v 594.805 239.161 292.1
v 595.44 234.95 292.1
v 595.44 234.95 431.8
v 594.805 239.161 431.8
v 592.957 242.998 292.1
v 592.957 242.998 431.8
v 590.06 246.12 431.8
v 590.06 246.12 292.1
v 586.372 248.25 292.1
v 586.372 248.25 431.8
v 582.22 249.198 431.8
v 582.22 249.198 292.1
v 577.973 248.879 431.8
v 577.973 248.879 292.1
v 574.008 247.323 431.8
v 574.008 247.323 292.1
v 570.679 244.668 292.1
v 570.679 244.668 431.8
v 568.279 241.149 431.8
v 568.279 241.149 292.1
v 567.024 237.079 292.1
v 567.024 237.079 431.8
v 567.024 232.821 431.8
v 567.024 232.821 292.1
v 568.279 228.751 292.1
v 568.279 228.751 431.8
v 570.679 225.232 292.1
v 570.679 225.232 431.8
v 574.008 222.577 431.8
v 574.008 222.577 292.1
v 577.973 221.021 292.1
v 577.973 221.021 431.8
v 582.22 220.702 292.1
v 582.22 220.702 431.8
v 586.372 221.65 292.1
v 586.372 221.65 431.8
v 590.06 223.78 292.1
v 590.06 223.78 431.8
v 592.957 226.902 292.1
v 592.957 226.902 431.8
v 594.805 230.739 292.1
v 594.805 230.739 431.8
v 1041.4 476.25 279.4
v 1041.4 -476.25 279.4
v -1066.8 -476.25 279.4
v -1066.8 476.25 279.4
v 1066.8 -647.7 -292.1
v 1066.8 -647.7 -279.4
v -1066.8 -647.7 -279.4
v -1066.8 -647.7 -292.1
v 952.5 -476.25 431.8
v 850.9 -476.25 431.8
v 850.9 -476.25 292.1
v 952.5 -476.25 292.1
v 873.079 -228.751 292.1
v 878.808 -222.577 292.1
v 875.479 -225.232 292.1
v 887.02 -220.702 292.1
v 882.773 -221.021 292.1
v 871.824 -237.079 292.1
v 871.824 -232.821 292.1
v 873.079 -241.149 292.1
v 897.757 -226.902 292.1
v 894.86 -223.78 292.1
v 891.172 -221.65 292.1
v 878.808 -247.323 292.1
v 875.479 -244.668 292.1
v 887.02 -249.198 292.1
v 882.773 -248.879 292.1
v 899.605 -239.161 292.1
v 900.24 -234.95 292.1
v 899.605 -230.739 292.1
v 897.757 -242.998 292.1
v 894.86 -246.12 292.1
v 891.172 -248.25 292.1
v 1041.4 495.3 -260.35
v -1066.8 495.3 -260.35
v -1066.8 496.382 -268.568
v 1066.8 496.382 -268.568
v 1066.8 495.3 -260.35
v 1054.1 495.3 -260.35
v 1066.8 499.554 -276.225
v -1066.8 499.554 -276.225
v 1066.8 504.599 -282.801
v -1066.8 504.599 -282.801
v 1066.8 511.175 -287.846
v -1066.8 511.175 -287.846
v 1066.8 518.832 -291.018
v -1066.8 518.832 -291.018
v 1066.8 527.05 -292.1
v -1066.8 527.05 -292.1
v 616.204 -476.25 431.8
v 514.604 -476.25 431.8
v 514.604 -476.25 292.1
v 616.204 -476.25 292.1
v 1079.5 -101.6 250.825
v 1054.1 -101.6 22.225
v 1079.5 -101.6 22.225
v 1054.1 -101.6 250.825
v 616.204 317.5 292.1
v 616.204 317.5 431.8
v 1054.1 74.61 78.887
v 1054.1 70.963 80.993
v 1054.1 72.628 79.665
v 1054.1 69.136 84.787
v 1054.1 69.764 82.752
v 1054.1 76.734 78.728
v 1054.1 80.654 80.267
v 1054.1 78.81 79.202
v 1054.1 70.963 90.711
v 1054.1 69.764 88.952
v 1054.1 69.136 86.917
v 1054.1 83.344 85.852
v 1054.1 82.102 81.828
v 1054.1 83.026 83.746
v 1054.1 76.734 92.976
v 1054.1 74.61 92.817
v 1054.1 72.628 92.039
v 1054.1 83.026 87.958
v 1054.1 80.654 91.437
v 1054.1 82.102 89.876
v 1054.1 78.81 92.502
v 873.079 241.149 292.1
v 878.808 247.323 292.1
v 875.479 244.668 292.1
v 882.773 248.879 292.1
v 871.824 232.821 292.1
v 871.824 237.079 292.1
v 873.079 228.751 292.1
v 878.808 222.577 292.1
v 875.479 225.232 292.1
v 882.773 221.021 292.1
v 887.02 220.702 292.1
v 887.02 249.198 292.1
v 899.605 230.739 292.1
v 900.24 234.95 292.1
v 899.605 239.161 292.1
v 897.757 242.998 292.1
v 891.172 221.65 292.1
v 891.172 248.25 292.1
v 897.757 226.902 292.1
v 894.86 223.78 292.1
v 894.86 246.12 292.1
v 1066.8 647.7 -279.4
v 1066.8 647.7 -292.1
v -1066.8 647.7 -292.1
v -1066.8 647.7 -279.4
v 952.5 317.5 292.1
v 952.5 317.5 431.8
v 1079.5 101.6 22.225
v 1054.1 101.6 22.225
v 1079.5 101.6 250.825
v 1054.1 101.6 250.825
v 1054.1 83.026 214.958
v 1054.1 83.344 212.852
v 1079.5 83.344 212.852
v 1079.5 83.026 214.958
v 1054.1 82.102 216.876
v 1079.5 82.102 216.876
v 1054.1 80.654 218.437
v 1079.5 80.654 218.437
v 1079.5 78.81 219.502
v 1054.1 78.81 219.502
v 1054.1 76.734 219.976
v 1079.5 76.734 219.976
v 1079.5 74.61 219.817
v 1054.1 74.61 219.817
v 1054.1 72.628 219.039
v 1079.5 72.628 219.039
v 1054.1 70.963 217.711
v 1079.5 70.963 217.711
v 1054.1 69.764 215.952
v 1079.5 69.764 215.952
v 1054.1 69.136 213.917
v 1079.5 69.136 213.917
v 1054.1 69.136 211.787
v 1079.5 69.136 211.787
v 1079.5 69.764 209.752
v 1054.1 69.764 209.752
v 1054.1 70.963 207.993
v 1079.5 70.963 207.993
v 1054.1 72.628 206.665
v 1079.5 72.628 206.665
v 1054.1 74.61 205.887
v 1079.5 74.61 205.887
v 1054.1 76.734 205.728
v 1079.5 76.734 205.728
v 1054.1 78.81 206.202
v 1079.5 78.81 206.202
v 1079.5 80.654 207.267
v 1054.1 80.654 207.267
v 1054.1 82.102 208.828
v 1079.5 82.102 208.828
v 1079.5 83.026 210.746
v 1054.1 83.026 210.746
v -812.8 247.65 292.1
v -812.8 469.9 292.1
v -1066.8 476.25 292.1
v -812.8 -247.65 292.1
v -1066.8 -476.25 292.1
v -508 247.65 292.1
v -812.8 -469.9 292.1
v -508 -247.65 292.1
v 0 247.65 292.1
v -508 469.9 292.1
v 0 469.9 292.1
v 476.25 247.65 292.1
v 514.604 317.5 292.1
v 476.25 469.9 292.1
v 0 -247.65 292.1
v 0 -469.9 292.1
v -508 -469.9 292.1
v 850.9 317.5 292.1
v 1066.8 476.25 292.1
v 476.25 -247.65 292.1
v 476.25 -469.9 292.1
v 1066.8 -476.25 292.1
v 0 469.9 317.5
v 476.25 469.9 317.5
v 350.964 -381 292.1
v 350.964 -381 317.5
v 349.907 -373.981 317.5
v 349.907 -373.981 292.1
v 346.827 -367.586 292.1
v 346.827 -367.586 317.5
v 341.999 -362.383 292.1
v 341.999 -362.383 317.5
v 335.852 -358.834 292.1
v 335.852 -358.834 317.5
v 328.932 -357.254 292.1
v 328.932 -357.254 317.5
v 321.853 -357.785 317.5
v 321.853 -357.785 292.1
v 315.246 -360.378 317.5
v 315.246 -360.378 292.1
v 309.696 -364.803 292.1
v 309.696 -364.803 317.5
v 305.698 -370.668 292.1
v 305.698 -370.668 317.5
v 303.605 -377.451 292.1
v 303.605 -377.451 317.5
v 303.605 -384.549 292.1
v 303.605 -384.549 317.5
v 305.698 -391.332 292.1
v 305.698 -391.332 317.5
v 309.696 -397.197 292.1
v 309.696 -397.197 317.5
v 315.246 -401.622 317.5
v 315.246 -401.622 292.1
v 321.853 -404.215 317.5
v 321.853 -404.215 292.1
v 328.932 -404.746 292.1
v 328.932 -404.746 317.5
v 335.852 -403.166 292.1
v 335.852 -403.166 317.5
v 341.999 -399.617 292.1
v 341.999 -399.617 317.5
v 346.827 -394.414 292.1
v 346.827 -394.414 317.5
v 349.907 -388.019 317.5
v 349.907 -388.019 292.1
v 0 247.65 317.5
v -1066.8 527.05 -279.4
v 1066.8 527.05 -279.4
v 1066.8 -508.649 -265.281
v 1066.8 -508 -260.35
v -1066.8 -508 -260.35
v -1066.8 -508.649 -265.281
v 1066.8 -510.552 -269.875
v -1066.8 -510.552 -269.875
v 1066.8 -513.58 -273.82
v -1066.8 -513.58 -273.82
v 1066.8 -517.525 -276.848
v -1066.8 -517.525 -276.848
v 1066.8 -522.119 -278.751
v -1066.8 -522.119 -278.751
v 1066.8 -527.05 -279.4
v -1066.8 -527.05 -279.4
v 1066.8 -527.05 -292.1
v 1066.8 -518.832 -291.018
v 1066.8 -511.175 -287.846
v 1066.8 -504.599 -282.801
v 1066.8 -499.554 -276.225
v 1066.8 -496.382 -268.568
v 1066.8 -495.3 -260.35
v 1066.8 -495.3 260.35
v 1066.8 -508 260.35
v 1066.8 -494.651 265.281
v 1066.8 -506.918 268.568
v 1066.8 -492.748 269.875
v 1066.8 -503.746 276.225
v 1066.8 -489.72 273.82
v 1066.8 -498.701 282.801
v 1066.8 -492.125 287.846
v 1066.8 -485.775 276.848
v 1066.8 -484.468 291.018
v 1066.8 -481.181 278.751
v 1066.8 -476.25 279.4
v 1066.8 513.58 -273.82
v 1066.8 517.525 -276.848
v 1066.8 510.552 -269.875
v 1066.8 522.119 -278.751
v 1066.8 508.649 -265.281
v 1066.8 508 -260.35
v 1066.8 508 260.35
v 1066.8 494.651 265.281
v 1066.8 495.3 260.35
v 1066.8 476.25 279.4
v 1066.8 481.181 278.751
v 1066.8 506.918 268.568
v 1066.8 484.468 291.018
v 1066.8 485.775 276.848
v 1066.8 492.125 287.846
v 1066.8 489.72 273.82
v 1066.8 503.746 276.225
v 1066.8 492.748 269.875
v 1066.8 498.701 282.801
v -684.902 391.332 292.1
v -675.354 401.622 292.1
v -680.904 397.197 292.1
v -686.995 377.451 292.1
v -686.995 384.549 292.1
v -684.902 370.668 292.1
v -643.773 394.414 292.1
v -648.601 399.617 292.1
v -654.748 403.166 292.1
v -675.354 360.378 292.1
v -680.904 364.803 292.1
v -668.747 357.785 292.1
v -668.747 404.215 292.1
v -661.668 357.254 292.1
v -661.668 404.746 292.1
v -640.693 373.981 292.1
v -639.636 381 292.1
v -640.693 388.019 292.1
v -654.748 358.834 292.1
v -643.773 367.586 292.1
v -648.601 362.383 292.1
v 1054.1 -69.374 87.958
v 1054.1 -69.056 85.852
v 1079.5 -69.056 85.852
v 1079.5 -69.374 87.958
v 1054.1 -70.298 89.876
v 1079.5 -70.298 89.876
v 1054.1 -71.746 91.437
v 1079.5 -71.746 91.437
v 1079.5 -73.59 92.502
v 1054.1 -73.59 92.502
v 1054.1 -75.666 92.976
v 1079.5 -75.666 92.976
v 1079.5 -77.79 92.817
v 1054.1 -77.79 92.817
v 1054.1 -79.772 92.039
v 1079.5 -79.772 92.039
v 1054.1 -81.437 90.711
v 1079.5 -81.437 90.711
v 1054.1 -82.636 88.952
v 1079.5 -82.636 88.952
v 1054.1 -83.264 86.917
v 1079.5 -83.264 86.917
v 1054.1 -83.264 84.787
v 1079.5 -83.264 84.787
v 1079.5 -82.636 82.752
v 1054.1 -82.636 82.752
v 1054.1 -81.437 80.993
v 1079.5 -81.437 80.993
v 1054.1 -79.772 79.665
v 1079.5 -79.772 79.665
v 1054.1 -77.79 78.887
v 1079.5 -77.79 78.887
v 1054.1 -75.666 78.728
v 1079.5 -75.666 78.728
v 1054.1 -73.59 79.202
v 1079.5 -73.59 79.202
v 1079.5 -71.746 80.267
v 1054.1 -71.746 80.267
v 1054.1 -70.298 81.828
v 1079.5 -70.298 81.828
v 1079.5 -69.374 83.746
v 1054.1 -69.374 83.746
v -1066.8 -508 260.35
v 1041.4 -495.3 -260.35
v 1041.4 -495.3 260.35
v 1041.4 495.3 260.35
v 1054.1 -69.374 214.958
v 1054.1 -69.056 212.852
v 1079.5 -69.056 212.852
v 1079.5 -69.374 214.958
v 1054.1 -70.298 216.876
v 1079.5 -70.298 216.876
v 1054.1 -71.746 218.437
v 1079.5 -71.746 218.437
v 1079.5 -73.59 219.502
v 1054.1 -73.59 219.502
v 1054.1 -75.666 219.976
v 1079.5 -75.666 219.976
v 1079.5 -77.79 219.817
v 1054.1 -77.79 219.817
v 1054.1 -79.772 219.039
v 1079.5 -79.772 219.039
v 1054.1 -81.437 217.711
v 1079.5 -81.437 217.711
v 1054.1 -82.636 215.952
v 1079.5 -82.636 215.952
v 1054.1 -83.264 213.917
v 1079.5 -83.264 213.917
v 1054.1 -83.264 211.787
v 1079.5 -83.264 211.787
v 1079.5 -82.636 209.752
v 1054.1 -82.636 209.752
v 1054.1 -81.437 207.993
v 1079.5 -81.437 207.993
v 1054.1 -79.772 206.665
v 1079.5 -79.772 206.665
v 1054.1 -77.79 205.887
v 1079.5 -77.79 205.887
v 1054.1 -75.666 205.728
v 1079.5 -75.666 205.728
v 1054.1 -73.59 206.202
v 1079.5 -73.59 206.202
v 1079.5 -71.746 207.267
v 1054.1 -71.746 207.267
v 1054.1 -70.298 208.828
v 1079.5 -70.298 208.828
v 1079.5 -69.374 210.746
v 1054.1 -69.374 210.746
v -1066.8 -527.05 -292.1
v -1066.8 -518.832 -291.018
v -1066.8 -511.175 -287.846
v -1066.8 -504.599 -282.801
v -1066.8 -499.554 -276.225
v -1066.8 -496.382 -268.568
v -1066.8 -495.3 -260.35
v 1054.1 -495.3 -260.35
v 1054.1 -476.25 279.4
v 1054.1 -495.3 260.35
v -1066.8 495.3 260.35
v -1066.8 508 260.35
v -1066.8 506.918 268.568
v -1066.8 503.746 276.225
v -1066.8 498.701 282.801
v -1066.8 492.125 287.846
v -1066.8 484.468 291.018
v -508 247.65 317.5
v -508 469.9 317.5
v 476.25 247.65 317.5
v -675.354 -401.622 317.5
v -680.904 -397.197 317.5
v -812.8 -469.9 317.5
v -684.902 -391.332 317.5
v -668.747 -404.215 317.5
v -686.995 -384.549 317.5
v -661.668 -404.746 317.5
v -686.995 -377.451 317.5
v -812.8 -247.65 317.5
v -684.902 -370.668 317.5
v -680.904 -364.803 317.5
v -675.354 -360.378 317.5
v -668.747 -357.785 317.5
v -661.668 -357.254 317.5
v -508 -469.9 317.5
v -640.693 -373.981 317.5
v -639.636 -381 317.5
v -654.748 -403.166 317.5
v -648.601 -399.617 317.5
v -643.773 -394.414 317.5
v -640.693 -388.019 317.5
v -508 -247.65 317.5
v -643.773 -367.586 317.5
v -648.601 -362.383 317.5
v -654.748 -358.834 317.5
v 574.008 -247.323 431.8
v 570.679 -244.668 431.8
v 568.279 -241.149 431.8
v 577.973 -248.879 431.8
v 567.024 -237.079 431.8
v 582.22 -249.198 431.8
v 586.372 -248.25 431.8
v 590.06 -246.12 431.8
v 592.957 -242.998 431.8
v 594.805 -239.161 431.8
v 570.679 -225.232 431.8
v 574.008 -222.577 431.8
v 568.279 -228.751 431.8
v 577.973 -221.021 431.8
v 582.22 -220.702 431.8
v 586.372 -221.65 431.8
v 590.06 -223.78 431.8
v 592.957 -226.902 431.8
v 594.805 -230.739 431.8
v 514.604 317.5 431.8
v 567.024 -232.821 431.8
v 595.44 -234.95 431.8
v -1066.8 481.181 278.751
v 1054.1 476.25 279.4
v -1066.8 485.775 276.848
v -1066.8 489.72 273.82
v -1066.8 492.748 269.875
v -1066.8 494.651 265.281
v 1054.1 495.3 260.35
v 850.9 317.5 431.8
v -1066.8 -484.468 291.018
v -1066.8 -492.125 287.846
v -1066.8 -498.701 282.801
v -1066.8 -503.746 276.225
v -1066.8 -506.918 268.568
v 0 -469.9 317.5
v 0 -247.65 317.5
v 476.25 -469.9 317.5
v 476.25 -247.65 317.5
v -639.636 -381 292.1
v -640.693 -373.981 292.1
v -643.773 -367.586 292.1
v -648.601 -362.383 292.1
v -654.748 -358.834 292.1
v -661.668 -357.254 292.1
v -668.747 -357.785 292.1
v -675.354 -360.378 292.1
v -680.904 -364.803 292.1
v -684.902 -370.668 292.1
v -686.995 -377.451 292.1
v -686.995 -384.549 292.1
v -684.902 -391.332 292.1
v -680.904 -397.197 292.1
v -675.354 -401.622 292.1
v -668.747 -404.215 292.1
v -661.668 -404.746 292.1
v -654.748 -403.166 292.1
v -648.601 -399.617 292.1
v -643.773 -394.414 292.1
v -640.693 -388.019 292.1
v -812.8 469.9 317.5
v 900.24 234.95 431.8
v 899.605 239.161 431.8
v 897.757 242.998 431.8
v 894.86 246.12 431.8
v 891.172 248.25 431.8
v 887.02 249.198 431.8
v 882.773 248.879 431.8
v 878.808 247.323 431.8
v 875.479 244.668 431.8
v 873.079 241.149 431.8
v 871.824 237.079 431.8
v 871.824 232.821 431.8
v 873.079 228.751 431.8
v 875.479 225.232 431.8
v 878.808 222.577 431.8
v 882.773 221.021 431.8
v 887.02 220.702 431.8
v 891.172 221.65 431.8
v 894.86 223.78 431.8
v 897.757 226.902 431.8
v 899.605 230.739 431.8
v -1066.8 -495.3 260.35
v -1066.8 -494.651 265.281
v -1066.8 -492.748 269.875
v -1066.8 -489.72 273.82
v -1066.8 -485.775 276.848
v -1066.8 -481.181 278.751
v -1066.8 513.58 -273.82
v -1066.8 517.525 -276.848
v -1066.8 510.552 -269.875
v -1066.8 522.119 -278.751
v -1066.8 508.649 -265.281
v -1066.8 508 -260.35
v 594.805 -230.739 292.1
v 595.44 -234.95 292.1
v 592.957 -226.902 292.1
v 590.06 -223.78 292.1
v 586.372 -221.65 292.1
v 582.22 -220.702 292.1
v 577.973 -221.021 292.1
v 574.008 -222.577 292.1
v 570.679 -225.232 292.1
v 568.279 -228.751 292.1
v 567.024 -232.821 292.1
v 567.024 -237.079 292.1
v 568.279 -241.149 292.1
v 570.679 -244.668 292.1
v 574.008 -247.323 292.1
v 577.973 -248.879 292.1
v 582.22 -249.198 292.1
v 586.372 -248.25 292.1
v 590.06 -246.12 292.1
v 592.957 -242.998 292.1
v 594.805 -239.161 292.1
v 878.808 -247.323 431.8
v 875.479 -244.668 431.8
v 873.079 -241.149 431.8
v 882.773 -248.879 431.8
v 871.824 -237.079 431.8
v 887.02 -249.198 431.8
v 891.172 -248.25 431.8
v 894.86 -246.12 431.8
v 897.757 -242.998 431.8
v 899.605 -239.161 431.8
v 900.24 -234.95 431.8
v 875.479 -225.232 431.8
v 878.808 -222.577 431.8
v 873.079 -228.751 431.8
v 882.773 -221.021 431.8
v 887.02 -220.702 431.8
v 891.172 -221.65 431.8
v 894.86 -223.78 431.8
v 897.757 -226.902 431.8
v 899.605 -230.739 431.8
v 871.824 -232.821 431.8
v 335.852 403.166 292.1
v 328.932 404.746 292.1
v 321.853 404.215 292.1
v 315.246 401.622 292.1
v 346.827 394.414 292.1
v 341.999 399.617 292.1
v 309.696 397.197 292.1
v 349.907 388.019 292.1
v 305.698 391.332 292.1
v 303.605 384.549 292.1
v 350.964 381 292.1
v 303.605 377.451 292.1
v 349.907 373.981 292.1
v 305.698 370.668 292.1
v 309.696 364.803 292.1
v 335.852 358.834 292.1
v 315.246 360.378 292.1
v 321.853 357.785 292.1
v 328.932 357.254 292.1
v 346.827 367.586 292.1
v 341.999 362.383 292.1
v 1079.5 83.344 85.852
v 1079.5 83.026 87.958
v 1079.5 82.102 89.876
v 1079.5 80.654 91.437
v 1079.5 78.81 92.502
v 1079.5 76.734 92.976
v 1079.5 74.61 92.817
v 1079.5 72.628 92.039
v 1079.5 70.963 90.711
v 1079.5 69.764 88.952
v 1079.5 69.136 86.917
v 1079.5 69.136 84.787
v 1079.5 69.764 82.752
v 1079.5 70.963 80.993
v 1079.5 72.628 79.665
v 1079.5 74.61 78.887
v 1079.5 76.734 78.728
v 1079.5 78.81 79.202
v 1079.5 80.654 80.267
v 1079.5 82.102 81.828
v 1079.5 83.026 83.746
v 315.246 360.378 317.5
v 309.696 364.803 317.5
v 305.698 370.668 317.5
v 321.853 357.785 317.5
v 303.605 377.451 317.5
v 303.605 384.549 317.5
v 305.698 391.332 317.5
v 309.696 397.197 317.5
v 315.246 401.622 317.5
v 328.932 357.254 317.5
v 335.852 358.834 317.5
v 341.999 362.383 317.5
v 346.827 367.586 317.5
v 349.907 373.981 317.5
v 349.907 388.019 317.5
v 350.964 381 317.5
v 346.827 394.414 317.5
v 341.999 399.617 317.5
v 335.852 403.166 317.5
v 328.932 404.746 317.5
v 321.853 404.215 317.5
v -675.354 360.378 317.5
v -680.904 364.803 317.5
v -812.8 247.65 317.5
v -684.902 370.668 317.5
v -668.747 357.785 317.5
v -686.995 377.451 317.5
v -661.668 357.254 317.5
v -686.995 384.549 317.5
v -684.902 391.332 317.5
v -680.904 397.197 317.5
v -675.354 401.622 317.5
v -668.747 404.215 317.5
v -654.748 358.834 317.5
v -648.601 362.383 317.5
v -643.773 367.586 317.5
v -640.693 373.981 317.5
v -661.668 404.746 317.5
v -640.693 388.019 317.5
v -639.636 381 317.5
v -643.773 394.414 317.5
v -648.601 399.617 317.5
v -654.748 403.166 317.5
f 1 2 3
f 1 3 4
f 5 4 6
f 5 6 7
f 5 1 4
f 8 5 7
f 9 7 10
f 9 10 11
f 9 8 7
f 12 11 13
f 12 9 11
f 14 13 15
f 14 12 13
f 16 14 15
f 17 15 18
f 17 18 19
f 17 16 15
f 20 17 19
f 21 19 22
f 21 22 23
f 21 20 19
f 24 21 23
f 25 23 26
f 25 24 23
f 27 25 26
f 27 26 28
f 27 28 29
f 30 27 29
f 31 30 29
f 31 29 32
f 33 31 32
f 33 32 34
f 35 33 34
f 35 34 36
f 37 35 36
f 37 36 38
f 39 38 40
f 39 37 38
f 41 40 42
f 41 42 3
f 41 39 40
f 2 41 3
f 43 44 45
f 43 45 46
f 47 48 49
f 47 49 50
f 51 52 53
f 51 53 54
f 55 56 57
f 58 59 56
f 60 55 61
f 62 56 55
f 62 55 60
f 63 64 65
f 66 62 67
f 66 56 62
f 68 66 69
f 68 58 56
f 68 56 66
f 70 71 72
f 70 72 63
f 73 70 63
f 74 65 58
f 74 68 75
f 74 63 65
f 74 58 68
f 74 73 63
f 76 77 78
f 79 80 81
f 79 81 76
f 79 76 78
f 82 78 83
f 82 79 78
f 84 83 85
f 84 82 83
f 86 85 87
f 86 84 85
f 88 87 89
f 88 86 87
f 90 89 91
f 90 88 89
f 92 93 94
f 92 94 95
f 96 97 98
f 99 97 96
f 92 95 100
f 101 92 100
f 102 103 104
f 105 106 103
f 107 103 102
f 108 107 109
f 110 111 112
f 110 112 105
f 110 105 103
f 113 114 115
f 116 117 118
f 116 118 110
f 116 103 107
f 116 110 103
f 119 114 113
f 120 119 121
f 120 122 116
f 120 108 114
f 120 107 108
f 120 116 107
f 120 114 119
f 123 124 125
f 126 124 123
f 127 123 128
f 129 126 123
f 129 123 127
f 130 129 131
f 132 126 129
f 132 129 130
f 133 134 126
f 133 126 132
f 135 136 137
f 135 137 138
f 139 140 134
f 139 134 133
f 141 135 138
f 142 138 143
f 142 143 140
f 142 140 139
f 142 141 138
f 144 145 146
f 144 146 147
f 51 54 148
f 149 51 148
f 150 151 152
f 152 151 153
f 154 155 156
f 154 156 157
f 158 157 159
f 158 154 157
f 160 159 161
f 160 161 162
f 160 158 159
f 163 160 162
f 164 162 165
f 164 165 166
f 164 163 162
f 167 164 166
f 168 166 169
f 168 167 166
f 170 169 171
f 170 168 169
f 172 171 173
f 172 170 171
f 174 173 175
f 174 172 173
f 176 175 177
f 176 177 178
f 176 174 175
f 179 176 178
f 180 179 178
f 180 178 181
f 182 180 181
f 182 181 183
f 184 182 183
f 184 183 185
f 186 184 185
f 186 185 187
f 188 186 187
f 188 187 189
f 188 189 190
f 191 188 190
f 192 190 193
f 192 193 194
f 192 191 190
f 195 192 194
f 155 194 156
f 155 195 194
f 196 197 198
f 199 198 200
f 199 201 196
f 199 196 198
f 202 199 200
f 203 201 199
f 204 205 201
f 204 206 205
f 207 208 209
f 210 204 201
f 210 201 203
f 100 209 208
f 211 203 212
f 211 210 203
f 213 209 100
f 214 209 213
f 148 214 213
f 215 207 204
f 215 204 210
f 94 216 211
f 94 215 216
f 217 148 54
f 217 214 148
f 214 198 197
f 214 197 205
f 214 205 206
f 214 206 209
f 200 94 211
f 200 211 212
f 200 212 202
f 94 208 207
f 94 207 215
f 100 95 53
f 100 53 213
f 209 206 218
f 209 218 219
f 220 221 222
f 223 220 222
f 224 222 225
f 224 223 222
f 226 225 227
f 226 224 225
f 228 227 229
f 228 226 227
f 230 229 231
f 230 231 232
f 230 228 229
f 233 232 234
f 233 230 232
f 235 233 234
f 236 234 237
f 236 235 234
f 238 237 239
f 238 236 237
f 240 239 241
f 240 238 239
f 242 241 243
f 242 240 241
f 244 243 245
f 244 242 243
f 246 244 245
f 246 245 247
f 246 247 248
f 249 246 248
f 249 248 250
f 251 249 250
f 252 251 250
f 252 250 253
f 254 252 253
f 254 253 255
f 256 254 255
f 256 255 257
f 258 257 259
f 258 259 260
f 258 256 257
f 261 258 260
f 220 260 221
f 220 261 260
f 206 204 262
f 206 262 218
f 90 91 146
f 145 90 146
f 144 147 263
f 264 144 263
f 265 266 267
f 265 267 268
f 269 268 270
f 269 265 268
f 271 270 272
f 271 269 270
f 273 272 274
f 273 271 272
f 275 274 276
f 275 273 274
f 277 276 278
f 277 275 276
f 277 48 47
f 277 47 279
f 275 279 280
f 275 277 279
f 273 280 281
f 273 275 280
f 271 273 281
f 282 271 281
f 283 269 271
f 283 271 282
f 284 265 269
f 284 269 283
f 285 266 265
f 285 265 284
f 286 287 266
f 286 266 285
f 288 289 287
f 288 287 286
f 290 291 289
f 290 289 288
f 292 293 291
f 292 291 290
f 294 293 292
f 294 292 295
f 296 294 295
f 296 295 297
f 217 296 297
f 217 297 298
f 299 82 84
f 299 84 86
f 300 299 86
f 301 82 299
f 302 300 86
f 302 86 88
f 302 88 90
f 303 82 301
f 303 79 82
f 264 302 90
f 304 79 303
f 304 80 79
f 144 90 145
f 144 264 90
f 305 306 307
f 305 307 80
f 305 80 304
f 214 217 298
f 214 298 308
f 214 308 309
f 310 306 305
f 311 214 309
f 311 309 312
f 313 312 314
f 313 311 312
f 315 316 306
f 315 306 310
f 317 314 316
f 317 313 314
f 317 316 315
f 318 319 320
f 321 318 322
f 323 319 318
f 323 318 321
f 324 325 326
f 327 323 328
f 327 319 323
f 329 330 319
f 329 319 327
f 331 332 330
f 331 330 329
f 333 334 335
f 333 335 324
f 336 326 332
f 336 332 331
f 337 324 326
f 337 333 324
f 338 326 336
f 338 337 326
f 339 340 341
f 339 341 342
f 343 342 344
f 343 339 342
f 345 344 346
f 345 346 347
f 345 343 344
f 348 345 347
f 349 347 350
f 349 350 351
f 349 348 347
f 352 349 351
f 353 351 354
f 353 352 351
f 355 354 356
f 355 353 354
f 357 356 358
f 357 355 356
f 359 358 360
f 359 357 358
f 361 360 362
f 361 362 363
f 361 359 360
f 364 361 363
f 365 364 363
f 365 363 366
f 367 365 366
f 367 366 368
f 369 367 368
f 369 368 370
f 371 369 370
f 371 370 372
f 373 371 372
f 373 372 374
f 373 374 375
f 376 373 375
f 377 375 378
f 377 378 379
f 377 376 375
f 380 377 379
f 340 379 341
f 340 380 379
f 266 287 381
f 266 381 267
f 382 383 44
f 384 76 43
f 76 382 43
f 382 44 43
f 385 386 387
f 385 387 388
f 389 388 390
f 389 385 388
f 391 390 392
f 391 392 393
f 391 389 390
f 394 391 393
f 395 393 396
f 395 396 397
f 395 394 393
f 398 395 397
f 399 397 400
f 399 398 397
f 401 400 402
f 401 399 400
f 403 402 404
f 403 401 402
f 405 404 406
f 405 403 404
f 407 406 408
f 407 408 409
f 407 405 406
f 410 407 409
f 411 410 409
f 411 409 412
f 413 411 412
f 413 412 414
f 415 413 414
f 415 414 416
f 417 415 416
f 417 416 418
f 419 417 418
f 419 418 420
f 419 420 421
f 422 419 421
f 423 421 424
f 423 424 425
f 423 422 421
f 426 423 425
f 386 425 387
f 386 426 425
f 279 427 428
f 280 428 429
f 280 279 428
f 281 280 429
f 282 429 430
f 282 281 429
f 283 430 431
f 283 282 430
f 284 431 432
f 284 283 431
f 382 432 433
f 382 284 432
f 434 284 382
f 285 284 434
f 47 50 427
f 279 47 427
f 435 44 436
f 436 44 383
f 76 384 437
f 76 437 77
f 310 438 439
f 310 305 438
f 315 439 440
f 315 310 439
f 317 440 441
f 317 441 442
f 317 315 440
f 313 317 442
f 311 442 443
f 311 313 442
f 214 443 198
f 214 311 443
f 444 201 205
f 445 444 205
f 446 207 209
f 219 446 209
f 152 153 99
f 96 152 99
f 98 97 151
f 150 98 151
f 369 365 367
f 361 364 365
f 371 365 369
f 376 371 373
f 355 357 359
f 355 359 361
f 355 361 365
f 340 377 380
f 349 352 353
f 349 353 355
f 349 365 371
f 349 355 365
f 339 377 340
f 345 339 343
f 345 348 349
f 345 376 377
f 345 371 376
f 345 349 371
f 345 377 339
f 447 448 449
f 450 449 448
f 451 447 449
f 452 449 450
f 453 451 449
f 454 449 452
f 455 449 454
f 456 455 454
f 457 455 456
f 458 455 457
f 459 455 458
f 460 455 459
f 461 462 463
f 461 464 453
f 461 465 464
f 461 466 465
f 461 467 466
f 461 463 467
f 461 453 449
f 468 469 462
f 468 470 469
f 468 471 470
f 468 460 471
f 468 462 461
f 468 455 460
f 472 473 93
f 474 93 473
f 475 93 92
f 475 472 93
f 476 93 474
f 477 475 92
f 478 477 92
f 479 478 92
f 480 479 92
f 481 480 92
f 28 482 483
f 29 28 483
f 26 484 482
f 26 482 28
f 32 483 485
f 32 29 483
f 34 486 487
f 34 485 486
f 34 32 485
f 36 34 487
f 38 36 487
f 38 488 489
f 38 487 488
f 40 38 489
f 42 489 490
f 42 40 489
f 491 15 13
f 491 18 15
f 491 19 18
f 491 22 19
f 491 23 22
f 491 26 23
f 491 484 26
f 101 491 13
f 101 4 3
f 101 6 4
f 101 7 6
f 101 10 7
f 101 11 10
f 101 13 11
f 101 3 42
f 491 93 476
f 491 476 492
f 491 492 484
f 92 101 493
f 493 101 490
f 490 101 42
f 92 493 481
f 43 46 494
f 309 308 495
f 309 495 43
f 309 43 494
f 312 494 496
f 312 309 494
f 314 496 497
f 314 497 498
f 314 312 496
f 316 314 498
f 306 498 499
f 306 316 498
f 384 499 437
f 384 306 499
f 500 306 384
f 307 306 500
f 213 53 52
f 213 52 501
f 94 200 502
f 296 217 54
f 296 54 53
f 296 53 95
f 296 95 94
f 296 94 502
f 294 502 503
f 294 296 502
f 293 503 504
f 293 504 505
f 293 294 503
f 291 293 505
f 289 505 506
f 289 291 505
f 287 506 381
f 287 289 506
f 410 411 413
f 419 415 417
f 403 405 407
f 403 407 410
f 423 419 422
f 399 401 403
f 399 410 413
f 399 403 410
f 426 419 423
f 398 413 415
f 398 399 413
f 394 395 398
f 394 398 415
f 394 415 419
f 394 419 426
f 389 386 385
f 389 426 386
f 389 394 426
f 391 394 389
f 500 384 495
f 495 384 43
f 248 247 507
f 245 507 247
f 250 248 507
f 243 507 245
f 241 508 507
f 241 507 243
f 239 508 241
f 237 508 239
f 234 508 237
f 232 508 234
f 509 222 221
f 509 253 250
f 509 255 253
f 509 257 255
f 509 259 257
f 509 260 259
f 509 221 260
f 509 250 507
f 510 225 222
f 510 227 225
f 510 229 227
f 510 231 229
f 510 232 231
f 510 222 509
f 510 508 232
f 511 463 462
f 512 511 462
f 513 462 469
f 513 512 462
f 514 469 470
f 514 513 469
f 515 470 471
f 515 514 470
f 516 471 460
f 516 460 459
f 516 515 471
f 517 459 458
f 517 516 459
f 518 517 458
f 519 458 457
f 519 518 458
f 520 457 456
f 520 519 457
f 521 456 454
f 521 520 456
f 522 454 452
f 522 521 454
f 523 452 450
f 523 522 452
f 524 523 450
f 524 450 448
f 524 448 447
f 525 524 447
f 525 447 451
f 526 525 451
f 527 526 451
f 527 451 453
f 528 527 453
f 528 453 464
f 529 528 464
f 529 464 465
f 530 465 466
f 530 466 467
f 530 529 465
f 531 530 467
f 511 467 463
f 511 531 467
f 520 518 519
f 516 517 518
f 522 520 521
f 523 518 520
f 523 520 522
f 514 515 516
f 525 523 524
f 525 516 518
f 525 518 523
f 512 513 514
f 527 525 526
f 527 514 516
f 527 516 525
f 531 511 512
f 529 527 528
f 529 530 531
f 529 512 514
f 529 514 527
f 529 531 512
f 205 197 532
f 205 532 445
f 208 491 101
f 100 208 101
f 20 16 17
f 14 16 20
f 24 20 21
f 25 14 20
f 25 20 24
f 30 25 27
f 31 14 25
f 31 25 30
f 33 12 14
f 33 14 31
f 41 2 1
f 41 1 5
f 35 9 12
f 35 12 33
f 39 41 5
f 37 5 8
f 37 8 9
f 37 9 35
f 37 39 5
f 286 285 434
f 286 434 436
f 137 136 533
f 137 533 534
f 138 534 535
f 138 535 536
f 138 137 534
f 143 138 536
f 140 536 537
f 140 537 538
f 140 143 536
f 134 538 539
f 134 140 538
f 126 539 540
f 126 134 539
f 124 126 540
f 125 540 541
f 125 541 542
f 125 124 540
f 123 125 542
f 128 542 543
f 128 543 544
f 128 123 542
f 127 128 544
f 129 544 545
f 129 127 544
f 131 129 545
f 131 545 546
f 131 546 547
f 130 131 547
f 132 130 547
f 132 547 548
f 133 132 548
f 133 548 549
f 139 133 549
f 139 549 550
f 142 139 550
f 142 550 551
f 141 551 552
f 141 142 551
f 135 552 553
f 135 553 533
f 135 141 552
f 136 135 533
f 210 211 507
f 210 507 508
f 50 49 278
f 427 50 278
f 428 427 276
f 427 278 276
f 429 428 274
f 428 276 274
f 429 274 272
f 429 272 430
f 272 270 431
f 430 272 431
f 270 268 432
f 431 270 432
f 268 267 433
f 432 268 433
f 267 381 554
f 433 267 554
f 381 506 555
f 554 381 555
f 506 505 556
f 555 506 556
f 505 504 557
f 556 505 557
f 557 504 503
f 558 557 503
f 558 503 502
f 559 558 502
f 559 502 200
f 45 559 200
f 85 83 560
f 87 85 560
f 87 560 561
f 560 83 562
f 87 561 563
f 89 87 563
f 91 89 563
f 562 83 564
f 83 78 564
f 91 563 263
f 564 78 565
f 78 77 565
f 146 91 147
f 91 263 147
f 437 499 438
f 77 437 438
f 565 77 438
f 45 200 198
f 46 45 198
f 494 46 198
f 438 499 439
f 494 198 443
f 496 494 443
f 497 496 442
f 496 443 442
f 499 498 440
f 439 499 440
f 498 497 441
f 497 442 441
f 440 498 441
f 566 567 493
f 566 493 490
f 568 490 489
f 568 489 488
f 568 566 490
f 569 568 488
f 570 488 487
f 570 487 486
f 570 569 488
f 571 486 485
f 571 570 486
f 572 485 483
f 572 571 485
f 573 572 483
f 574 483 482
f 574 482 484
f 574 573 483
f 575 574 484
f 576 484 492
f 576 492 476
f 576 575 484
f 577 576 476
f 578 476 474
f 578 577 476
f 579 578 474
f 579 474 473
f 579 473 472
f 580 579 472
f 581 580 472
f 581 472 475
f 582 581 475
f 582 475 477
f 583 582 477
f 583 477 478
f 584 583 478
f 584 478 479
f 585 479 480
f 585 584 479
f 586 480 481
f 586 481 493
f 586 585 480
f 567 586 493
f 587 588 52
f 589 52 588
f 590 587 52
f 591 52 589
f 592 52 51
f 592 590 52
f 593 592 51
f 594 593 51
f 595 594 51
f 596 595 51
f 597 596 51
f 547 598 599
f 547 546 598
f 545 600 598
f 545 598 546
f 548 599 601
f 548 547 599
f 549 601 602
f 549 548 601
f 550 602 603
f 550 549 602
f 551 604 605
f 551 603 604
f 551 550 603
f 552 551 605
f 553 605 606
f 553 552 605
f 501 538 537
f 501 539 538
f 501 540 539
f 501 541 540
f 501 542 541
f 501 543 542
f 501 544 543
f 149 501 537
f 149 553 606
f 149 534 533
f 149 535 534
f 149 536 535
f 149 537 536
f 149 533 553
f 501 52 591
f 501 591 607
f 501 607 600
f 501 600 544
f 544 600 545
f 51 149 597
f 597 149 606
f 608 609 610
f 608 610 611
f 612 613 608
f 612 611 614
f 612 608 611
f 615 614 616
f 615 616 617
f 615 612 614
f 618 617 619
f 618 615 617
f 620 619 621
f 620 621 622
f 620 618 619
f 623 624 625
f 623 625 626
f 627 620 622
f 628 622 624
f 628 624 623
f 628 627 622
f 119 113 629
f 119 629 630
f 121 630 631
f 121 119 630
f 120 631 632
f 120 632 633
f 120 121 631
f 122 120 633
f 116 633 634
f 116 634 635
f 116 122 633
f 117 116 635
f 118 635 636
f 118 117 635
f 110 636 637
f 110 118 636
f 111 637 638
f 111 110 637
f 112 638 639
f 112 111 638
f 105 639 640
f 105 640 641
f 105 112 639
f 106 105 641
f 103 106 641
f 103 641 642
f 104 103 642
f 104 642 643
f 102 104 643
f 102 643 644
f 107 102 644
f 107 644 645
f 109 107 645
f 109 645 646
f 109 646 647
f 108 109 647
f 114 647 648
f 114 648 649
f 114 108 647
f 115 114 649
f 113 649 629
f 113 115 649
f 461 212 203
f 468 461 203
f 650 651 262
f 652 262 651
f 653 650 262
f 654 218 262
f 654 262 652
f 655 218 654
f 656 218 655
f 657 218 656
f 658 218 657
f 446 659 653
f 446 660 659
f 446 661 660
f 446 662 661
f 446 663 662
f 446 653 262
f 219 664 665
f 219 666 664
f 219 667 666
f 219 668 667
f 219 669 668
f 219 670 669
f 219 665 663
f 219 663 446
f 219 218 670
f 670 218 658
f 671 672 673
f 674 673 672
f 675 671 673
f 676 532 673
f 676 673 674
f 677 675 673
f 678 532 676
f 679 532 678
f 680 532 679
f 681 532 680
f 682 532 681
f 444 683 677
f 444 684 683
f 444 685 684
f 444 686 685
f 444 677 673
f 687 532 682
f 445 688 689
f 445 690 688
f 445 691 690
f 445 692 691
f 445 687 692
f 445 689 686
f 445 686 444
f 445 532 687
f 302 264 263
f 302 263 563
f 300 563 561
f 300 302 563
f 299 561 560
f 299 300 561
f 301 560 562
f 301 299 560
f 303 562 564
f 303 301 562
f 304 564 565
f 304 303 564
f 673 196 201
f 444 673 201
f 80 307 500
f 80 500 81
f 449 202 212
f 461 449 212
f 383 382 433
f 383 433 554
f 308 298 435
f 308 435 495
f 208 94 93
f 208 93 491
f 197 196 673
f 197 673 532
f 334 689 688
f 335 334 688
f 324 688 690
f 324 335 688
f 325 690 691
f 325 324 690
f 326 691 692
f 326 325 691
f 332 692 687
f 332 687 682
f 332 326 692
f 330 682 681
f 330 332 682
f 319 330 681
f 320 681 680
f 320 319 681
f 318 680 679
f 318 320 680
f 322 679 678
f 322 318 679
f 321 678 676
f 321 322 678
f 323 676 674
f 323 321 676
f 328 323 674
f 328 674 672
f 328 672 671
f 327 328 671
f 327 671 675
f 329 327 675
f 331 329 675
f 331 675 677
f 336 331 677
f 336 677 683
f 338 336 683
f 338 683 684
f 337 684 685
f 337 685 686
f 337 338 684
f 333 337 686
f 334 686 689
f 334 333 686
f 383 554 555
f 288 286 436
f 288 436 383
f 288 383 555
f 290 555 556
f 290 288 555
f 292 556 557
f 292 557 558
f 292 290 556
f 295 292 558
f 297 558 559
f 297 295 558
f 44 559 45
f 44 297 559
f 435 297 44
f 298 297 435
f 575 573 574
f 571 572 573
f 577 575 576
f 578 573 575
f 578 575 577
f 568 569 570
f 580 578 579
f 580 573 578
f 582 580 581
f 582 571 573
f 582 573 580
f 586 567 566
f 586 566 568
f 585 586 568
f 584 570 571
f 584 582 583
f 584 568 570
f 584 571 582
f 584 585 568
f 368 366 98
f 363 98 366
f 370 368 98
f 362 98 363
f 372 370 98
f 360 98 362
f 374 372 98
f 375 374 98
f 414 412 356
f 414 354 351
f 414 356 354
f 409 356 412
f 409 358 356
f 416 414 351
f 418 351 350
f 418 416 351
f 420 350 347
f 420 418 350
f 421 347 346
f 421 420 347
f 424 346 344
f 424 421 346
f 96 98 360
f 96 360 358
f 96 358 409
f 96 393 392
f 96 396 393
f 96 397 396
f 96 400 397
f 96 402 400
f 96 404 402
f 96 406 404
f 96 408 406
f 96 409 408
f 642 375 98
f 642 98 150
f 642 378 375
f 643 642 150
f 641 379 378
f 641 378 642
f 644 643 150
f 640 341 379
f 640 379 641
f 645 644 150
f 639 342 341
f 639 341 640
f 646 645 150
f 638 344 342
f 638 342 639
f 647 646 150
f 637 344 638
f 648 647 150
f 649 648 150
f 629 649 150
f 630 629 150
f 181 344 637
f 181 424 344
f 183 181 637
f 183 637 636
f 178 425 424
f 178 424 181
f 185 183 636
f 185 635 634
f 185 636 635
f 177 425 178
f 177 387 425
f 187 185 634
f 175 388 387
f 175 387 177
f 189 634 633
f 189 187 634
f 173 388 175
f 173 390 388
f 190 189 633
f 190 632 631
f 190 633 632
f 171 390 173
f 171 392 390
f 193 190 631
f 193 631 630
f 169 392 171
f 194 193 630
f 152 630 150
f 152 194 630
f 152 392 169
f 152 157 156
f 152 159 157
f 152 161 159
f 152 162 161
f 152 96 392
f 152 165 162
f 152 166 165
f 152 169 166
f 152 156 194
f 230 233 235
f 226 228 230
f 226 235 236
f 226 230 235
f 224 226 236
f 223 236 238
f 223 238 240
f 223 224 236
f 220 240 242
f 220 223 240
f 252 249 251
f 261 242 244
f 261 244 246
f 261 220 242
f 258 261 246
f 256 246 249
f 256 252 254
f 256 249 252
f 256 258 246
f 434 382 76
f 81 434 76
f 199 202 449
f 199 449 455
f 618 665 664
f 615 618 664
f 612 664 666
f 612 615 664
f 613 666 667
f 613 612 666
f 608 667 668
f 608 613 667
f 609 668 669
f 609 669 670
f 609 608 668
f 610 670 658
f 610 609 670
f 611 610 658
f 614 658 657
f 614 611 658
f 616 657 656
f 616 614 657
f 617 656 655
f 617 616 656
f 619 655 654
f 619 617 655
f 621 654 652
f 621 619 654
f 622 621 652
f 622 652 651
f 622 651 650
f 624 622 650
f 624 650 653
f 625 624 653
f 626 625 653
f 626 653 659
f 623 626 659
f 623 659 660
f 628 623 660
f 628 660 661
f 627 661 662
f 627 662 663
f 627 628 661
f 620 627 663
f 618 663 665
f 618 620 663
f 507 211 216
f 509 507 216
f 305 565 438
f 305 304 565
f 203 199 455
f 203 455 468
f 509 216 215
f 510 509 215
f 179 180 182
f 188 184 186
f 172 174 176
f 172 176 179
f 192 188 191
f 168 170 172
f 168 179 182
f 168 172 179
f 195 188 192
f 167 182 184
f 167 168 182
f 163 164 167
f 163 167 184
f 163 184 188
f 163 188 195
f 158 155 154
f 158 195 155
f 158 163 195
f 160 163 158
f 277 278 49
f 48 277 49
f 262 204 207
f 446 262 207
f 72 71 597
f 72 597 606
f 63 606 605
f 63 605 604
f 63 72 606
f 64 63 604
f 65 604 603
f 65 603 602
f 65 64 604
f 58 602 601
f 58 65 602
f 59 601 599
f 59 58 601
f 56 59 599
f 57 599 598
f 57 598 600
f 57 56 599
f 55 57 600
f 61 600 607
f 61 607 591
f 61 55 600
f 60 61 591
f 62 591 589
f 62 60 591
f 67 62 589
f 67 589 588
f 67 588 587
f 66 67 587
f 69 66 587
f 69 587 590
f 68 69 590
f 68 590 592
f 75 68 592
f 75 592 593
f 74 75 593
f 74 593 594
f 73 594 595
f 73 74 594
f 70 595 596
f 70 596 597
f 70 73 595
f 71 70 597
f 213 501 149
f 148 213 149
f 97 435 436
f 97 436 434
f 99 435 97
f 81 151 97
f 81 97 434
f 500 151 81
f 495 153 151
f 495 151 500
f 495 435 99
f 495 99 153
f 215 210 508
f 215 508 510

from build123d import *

# Parameters (mm, degrees)
F1_DEPTH  = 1066.8
F2_W      = 101.6
F2_H      = 793.75
F2_R      = 14.2875
F3_DEPTH  = 139.7
F4_W      = 304.8
F4_H      = 222.25
F4_R      = 23.8125
F4_W_2    = 476.25
F5_DEPTH  = 25.4
F8_DEPTH  = 12.7
F9_W      = 101.6
F9_H      = 228.6
F9_R      = 7.14375
F10_DEPTH = 25.4


with BuildPart() as f1:
    # F0 (on Right) → F1 (new body, symmetric)
    with BuildSketch(Plane.YZ):
        with BuildLine():
            Line((476.25, 292.1), (-476.25, 292.1))
            ThreePointArc((-476.25, 292.1), (-498.7006403027, 282.8006403027), (-508, 260.35))
            Line((-508, 260.35), (-508, -260.35))
            ThreePointArc((-508, -260.35), (-513.5796158184, -273.8203841816), (-527.05, -279.4))
            Line((-527.05, -279.4), (-647.7, -279.4))
            Line((-647.7, -279.4), (-647.7, -292.1))
            Line((-647.7, -292.1), (-527.05, -292.1))
            ThreePointArc((-527.05, -292.1), (-504.5993596973, -282.8006403027), (-495.3, -260.35))
            Line((-495.3, -260.35), (-495.3, 260.35))
            ThreePointArc((-495.3, 260.35), (-489.7203841816, 273.8203841816), (-476.25, 279.4))
            Line((-476.25, 279.4), (476.25, 279.4))
            ThreePointArc((476.25, 279.4), (489.7203841816, 273.8203841816), (495.3, 260.35))
            Line((495.3, 260.35), (495.3, -260.35))
            ThreePointArc((495.3, -260.35), (504.5993596973, -282.8006403027), (527.05, -292.1))
            Line((527.05, -292.1), (647.7, -292.1))
            Line((647.7, -292.1), (647.7, -279.4))
            Line((647.7, -279.4), (527.05, -279.4))
            ThreePointArc((527.05, -279.4), (513.5796158184, -273.8203841816), (508, -260.35))
            Line((508, -260.35), (508, 260.35))
            ThreePointArc((508, 260.35), (498.7006403027, 282.8006403027), (476.25, 292.1))
        make_face()
    extrude(amount=F1_DEPTH, both=True)

    # F2 (on face) → F3 (join)
    with BuildSketch(Plane.XY.offset(292.1)):
        with Locations((901.7, -79.375)):
            Rectangle(F2_W, F2_H)
        with Locations((885.952, -234.95)):
            Circle(F2_R, mode=Mode.SUBTRACT)
        with Locations((885.952, 234.95)):
            Circle(F2_R, mode=Mode.SUBTRACT)
        with Locations((565.404, -79.375)):
            Rectangle(F2_W, F2_H)
        with Locations((581.152, -234.95)):
            Circle(F2_R, mode=Mode.SUBTRACT)
        with Locations((581.152, 234.95)):
            Circle(F2_R, mode=Mode.SUBTRACT)
    extrude(amount=F3_DEPTH)

    # F4 (on face) → F5 (join)
    with BuildSketch(Plane.XY.offset(292.1)):
        with Locations((-660.4, -358.775)):
            Rectangle(F4_W, F4_H)
        with Locations((-663.448, -381)):
            Circle(F4_R, mode=Mode.SUBTRACT)
        with Locations((238.125, -358.775)):
            Rectangle(F4_W_2, F4_H)
        with Locations((327.152, -381)):
            Circle(F4_R, mode=Mode.SUBTRACT)
        with Locations((238.125, 358.775)):
            Rectangle(F4_W_2, F4_H)
        with Locations((327.152, 381)):
            Circle(F4_R, mode=Mode.SUBTRACT)
        with Locations((-660.4, 358.775)):
            Rectangle(F4_W, F4_H)
        with Locations((-663.448, 381)):
            Circle(F4_R, mode=Mode.SUBTRACT)
    extrude(amount=F5_DEPTH)

    # F7 (on offset) → F8 (join)
    with BuildSketch(Plane.YZ.offset(1041.4)):
        Polygon((495.3, -260.35), (495.3, 260.35), (476.25, 279.4), (-476.25, 279.4), (-495.3, 260.35), (-495.3, -260.35), align=None)
    extrude(amount=F8_DEPTH)

    # F9 (on face) → F10 (join)
    with BuildSketch(Plane.YZ.offset(1054.1)):
        with Locations((50.8, 136.525)):
            Rectangle(F9_W, F9_H)
        with Locations((76.2, 85.852)):
            Circle(F9_R, mode=Mode.SUBTRACT)
        with Locations((76.2, 212.852)):
            Circle(F9_R, mode=Mode.SUBTRACT)
        with Locations((-50.8, 136.525)):
            Rectangle(F9_W, F9_H)
        with Locations((-76.2, 85.852)):
            Circle(F9_R, mode=Mode.SUBTRACT)
        with Locations((-76.2, 212.852)):
            Circle(F9_R, mode=Mode.SUBTRACT)
    extrude(amount=F10_DEPTH)


solid = f1.part
